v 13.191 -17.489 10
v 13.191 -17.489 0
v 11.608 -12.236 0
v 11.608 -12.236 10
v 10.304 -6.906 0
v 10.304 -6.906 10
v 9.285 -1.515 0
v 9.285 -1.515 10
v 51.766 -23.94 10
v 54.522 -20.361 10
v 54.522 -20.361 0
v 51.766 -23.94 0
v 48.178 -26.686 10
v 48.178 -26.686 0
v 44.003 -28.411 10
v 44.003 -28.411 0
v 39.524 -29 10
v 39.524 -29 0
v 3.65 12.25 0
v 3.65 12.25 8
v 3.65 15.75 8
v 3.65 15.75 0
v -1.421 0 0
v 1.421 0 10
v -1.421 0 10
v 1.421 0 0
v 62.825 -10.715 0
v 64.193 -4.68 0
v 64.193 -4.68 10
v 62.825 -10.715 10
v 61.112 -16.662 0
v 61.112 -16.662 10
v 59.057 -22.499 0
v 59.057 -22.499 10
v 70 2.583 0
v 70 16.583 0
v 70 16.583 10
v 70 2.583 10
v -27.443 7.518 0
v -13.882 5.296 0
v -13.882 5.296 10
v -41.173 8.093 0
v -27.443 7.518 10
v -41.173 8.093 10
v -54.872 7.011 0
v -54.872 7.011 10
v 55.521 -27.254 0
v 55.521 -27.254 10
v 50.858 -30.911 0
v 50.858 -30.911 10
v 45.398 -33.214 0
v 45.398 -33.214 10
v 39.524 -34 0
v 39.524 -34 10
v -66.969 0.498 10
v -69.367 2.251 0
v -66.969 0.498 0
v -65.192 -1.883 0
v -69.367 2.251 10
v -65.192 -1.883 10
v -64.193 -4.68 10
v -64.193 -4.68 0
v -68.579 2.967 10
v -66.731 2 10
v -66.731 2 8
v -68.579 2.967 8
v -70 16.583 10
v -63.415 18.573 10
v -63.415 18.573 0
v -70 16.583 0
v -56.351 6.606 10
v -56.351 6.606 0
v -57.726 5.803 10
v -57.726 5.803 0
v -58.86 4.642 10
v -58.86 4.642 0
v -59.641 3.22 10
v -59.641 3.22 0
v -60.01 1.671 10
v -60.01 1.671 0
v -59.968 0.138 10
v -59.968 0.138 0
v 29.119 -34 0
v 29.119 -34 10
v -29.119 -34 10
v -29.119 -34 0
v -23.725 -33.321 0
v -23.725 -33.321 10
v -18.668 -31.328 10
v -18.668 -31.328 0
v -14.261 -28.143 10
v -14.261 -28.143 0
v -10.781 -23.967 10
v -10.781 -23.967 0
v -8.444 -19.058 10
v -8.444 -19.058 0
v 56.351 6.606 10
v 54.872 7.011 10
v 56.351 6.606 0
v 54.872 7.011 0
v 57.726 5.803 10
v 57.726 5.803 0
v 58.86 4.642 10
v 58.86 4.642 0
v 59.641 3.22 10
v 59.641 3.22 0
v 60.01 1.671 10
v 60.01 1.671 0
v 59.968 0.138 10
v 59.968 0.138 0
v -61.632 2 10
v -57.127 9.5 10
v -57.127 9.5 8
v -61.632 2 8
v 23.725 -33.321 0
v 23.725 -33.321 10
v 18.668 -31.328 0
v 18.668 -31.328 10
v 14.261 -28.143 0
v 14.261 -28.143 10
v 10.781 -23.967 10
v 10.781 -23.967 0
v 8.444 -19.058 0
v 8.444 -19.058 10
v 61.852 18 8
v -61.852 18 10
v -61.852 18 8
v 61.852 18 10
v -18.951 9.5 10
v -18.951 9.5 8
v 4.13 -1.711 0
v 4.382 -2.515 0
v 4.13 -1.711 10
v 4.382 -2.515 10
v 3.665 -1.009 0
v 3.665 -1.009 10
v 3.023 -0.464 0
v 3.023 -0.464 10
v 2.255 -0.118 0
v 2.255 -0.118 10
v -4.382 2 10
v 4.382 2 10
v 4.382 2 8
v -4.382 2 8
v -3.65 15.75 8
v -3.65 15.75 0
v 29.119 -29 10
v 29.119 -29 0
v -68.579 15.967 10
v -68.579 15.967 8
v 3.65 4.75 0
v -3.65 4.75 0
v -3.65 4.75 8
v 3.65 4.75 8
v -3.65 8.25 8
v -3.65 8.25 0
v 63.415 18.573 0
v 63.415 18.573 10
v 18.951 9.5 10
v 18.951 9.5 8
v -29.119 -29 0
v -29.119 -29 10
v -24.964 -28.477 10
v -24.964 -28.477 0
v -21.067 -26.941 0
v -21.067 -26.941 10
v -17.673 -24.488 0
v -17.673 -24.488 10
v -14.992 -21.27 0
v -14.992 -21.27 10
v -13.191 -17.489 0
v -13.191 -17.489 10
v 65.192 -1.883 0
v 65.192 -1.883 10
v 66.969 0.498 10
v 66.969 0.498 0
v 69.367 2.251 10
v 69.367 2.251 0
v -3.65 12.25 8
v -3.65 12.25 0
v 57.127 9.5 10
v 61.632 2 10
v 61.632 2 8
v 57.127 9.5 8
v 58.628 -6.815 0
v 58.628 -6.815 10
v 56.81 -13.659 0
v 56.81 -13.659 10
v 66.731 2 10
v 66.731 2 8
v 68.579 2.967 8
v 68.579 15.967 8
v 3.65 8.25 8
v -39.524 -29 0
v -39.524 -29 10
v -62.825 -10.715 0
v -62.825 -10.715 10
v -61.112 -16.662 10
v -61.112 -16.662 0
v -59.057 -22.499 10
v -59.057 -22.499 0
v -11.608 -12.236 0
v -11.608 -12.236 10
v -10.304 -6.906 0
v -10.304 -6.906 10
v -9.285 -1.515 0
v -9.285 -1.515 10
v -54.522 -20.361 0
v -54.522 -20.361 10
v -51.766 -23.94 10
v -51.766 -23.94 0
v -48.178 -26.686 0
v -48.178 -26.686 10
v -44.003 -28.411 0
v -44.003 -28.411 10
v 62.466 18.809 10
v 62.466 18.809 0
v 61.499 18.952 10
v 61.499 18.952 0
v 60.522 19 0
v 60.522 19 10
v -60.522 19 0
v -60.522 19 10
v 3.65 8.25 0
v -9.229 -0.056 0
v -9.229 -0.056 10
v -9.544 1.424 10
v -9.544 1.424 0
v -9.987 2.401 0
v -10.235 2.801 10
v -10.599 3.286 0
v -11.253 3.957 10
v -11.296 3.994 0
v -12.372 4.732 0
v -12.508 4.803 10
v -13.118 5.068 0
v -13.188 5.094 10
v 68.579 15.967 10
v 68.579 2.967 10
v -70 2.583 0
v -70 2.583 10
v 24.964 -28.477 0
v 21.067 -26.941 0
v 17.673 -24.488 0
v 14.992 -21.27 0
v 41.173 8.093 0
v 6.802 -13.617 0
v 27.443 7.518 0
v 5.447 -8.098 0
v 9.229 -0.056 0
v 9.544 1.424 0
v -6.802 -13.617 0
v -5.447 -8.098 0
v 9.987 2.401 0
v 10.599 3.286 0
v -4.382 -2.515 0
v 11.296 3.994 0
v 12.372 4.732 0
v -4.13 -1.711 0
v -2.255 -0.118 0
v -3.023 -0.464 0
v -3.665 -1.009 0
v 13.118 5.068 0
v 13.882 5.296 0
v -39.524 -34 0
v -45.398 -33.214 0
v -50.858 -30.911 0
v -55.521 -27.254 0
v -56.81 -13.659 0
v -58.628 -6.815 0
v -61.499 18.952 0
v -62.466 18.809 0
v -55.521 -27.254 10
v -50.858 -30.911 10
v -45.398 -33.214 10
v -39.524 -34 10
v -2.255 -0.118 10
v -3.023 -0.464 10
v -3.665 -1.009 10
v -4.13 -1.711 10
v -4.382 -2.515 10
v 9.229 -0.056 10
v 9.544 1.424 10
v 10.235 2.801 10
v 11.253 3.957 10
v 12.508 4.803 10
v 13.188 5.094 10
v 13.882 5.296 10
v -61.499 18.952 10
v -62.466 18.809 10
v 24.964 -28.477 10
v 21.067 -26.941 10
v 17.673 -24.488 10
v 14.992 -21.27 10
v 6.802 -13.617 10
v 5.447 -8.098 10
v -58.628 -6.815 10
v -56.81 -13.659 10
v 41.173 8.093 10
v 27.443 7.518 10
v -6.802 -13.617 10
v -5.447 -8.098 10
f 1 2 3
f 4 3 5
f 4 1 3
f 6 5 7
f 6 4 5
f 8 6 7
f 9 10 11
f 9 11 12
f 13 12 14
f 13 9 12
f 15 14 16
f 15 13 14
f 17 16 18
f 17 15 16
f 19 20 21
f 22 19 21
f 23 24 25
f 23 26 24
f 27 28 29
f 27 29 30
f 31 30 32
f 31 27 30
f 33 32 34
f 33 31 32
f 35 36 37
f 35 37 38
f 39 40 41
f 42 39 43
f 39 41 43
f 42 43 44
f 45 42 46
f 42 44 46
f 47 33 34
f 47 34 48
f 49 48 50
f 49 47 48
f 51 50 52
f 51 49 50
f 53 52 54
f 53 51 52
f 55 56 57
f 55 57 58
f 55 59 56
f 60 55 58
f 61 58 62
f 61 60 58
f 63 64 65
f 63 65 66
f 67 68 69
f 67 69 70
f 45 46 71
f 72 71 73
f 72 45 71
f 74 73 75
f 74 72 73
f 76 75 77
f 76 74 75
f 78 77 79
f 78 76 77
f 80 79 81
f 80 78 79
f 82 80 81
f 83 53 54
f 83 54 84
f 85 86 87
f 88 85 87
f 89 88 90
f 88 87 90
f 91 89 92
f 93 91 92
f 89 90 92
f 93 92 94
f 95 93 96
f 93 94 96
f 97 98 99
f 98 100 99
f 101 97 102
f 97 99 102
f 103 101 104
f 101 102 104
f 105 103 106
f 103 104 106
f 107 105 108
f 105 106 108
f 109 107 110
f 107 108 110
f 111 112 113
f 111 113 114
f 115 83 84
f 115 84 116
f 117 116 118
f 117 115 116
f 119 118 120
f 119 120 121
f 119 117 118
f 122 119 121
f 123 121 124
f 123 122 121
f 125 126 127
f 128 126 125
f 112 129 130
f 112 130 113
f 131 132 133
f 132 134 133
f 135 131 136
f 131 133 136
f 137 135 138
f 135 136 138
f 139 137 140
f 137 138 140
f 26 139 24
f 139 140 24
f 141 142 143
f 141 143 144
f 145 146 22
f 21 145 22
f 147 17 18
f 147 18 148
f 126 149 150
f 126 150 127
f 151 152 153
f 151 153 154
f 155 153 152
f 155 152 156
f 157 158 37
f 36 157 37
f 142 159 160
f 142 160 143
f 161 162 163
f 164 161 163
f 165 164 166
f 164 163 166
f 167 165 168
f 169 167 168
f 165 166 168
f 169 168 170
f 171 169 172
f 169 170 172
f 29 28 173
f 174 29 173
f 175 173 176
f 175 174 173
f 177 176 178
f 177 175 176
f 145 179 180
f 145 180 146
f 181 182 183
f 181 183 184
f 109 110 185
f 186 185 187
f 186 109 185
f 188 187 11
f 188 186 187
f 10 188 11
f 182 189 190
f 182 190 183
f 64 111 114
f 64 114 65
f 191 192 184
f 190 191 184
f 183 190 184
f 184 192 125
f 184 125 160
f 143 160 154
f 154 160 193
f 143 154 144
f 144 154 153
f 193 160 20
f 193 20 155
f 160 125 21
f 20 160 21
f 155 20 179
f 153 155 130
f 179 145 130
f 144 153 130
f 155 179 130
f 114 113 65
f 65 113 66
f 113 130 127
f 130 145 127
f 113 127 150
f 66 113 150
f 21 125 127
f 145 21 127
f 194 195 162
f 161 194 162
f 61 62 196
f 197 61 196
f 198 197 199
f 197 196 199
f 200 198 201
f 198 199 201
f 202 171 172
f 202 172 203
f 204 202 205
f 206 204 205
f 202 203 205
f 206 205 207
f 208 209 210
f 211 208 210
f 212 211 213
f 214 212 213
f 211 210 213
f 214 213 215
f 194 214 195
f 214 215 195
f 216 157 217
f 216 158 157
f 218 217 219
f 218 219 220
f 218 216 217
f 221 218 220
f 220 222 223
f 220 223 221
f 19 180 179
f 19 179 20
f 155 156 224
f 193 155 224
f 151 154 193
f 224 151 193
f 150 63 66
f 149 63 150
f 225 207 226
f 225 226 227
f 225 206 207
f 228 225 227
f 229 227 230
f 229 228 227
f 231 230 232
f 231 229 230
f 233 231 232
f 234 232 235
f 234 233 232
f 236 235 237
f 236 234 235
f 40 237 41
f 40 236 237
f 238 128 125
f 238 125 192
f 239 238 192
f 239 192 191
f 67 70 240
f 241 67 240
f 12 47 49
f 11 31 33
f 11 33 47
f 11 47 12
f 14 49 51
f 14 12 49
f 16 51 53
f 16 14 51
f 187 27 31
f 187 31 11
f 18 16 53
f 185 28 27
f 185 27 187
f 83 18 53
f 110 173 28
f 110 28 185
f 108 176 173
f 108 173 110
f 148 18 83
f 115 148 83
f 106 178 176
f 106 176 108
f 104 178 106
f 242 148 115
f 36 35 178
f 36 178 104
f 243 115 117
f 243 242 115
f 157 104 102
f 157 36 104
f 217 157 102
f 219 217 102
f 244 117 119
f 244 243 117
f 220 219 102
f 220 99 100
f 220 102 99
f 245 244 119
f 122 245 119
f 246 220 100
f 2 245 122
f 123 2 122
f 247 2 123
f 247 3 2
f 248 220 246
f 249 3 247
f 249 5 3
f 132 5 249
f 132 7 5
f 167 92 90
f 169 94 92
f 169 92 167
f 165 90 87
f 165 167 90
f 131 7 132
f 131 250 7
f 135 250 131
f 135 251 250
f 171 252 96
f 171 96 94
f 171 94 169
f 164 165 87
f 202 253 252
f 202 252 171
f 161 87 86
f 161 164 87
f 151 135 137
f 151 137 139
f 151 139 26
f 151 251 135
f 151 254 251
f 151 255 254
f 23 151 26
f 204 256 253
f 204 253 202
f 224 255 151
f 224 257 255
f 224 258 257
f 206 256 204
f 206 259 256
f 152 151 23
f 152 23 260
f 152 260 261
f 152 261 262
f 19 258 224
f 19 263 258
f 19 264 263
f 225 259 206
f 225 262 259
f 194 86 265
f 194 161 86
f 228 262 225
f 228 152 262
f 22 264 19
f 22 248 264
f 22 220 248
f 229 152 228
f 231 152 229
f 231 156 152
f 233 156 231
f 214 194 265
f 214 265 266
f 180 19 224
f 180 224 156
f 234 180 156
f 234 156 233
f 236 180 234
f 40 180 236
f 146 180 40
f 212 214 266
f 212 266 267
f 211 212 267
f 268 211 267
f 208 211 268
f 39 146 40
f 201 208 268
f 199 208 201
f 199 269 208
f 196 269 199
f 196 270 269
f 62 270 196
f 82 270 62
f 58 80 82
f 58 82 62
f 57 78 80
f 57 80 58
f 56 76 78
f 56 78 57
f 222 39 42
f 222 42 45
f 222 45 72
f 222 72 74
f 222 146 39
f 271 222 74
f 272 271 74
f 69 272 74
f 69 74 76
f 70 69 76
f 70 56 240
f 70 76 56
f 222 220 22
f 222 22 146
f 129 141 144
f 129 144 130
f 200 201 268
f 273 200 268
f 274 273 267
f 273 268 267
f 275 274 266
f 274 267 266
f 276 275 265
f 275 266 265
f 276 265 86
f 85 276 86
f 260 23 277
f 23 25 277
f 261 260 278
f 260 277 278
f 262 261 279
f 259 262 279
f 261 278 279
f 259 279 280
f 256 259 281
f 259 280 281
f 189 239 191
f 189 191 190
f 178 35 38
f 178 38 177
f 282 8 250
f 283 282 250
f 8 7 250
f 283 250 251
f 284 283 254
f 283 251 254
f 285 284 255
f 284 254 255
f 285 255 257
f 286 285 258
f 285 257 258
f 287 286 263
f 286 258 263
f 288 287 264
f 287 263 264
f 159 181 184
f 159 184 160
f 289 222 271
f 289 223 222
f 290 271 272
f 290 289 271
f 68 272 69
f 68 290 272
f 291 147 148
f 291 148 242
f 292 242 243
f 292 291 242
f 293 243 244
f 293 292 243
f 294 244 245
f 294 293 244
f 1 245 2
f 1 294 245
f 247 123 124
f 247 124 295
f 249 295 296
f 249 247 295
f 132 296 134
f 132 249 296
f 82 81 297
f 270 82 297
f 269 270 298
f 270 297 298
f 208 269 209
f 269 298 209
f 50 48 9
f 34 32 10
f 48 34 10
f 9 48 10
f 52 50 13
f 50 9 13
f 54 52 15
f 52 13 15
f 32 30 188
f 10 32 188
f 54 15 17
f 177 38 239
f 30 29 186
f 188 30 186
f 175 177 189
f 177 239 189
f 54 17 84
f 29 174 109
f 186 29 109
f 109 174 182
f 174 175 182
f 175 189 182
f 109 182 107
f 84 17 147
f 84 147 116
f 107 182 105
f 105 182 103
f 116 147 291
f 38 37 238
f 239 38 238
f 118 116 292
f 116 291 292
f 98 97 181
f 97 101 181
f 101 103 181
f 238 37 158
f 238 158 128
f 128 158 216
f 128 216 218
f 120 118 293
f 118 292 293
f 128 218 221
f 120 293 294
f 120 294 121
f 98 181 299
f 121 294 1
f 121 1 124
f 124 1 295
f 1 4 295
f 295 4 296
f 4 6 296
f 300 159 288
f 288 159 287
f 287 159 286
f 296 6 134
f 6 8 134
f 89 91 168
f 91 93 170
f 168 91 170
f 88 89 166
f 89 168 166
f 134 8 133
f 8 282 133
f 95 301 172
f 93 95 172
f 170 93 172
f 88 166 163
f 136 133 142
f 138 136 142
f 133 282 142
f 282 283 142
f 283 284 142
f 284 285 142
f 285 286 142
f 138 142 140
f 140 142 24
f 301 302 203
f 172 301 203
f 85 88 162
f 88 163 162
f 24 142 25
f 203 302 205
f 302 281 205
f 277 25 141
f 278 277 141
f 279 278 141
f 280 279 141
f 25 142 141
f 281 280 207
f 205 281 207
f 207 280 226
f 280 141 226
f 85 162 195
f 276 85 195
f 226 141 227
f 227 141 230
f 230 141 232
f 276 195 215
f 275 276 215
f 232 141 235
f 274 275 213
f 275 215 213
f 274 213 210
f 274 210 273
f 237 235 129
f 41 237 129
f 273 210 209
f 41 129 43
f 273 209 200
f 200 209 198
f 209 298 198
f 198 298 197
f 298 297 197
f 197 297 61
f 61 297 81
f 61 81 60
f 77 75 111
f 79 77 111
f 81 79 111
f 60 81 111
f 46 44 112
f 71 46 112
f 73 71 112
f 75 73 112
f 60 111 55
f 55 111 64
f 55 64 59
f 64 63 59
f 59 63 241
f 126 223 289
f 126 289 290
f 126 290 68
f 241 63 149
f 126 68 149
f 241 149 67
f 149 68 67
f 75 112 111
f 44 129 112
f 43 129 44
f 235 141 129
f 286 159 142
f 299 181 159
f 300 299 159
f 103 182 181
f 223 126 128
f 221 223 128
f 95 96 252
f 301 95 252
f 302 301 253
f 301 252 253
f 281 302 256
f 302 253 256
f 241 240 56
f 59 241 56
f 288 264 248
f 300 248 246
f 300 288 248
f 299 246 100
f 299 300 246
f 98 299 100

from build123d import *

# Parameters (mm, degrees)
BOSS_EXTRUDE1_DEPTH  = 10
CUT_EXTRUDE1_DEPTH   = 79.460180984
FILLET1_R            = 6
FILLET4_R            = 3
FILLET5_R            = 10
FILLET1_OF_MIRROR2_R = 6
FILLET4_OF_MIRROR2_R = 3
FILLET5_OF_MIRROR2_R = 10
CUT_EXTRUDE2_DEPTH   = 2
SKETCH4_W            = 7.3
SKETCH4_H            = 3.5
CUT_EXTRUDE3_DEPTH   = 79.230429006


with BuildPart() as part:
    # Sketch1 → Boss-Extrude1 (new body)
    with BuildSketch(Plane.XY):
        with BuildLine():
            Line((-70, 16.58258549), (-70, 2.58258549))
            Line((-70, 2.58258549), (-65, -0.035347018))
            ThreePointArc((-65, -0.035347018), (-62.639321295, -11.428715409), (-59.057390955, -22.499009997))
            ThreePointArc((-59.057390955, -22.499009997), (-50.858075368, -30.911196539), (-39.524366721, -34))
            Line((-39.524366721, -34), (-29.119439011, -34))
            ThreePointArc((-29.119439011, -34), (-16.364659062, -29.873537236), (-8.443933007, -19.058075838))
            ThreePointArc((-8.443933007, -19.058075838), (-5.792248942, -9.629238804), (-4, 0))
            Line((-4, 0), (0, 0))
            Line((0, 0), (0, 19))
            Line((0, 19), (-62, 19))
            Line((-62, 19), (-70, 16.58258549))
        make_face()
    boss_extrude1 = extrude(amount=BOSS_EXTRUDE1_DEPTH)

    # Sketch2 → Cut-Extrude1 (cut, through all)
    with BuildSketch(Plane.XY.offset(10)):
        with BuildLine():
            Line((-39.524366721, -29), (-29.119439011, -29))
            ThreePointArc((-29.119439011, -29), (-19.293350153, -25.821035725), (-13.191343035, -17.488968441))
            ThreePointArc((-13.191343035, -17.488968441), (-10.661621804, -8.493805879), (-8.951806424, 0.692541077))
            ThreePointArc((-8.951806424, 0.692541077), (-8.83111114, 2.375291538), (-8.93749946, 4.05900707))
            ThreePointArc((-8.93749946, 4.05900707), (-33.987475013, 7.999161751), (-59.288689209, 6.303681198))
            ThreePointArc((-59.288689209, 6.303681198), (-60.075532666, 3.563074376), (-60.056140486, 0.711816353))
            ThreePointArc((-60.056140486, 0.711816353), (-57.852345066, -9.972645379), (-54.521869403, -20.361214511))
            ThreePointArc((-54.521869403, -20.361214511), (-48.178176596, -26.685865227), (-39.524366721, -29))
        make_face()
    cut_extrude1 = extrude(amount=-CUT_EXTRUDE1_DEPTH, mode=Mode.SUBTRACT)

    # Fillet1
    fillet1_edges = [part.edges().sort_by_distance(p)[0] for p in [
        (-8.93749946, 4.05900707, 5),
        (-59.288689209, 6.303681198, 5),
    ]]
    fillet(fillet1_edges, radius=FILLET1_R)

    # Fillet4
    fillet4_edges = [part.edges().sort_by_distance(p)[0] for p in [
        (-4, 0, 5),
    ]]
    fillet(fillet4_edges, radius=FILLET4_R)

    # Fillet5
    fillet5_edges = [part.edges().sort_by_distance(p)[0] for p in [
        (-65, -0.035347018, 5),
        (-62, 19, 5),
    ]]
    fillet(fillet5_edges, radius=FILLET5_R)

    # Mirror2: Boss-Extrude1, Cut-Extrude1 across plane
    add(boss_extrude1.mirror(Plane(origin=(0, 19, 10), x_dir=(0, 0, 1), z_dir=(1, 0, 0))))
    add(cut_extrude1.mirror(Plane(origin=(0, 19, 10), x_dir=(0, 0, 1), z_dir=(1, 0, 0))), mode=Mode.SUBTRACT)

    # Fillet1 of Mirror2
    fillet1_of_mirror2_edges = [part.edges().sort_by_distance(p)[0] for p in [
        (8.93749946, 4.05900707, 5),
        (59.288689209, 6.303681198, 5),
    ]]
    fillet(fillet1_of_mirror2_edges, radius=FILLET1_OF_MIRROR2_R)

    # Fillet4 of Mirror2
    fillet4_of_mirror2_edges = [part.edges().sort_by_distance(p)[0] for p in [
        (4, 0, 5),
    ]]
    fillet(fillet4_of_mirror2_edges, radius=FILLET4_OF_MIRROR2_R)

    # Fillet5 of Mirror2
    fillet5_of_mirror2_edges = [part.edges().sort_by_distance(p)[0] for p in [
        (65, -0.035347018, 5),
        (62, 19, 5),
    ]]
    fillet(fillet5_of_mirror2_edges, radius=FILLET5_OF_MIRROR2_R)

    # Sketch3 → Cut-Extrude2 (cut)
    with BuildSketch(Plane.XY.offset(10)):
        Polygon((-68.579000582, 15.967320332), (-61.852211578, 18), (61.852211578, 18), (68.579000582, 15.967320332), (68.579000582, 2.967348727), (66.731457293, 2), (61.632252323, 2), (57.126911514, 9.5), (18.95111491, 9.5), (4.382114171, 2), (-4.382114171, 2), (-18.95111491, 9.5), (-57.126911514, 9.5), (-61.632252323, 2), (-66.731457293, 2), (-68.579000582, 2.967348727), align=None)
    extrude(amount=-CUT_EXTRUDE2_DEPTH, mode=Mode.SUBTRACT)

    # Sketch4 → Cut-Extrude3 (cut, through all)
    with BuildSketch(Plane.XY.offset(8)):
        with Locations((0, 14)):
            Rectangle(SKETCH4_W, SKETCH4_H)
        with Locations((0, 6.5)):
            Rectangle(SKETCH4_W, SKETCH4_H)
    extrude(amount=-CUT_EXTRUDE3_DEPTH, mode=Mode.SUBTRACT)


solid = part.part
